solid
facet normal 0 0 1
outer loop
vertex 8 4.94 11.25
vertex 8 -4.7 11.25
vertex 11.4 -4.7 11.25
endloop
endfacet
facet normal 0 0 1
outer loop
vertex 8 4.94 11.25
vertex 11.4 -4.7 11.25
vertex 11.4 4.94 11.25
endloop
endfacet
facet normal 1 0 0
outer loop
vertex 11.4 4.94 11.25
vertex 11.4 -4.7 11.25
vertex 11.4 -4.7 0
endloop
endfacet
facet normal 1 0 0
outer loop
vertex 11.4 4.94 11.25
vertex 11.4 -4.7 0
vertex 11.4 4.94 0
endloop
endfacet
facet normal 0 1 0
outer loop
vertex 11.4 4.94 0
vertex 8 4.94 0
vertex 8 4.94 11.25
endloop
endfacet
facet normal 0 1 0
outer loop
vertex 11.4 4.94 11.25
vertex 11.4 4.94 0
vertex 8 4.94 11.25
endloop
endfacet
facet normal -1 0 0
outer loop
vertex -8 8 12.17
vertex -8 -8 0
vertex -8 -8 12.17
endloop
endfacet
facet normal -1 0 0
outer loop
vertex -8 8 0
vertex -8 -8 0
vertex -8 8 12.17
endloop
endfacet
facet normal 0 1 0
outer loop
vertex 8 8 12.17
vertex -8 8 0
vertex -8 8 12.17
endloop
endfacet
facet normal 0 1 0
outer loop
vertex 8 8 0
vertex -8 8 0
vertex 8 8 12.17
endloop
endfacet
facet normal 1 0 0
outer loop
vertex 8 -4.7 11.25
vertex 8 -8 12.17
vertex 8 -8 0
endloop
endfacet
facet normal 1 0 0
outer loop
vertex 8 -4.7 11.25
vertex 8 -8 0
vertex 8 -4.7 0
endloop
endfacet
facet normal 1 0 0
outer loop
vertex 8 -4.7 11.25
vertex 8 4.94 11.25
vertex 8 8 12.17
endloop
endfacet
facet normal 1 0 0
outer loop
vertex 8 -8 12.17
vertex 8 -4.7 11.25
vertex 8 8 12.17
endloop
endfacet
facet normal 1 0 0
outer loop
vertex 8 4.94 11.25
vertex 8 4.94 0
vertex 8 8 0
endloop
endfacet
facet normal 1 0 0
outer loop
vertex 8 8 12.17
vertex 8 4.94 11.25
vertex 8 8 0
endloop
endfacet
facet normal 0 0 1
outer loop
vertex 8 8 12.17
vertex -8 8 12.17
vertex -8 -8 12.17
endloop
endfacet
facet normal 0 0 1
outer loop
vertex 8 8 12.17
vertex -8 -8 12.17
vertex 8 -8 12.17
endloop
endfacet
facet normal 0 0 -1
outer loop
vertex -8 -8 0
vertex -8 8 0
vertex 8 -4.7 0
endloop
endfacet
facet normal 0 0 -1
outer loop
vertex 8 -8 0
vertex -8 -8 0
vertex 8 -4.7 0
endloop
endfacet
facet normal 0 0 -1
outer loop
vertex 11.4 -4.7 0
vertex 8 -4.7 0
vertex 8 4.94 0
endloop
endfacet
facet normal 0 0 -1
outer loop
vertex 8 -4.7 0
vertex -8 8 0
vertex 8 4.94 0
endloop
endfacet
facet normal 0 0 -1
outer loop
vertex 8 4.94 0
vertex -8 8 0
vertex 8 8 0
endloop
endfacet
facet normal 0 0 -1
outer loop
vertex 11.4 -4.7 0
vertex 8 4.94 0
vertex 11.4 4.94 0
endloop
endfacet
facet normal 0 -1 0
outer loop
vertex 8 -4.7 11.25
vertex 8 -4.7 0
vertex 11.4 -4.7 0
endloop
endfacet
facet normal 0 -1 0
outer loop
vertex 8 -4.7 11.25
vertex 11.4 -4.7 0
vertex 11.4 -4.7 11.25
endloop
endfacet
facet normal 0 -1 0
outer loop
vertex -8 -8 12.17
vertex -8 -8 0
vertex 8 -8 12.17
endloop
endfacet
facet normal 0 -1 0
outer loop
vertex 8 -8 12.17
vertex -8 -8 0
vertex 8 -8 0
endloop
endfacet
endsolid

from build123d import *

# Parameters (mm, degrees)
F0_W     = 16
F0_H     = 16
F1_DEPTH = 12.17
F2_W     = 9.64
F2_H     = 11.25
F3_DEPTH = 3.4


with BuildPart() as f1:
    # F0 (on Top) → F1 (new body)
    with BuildSketch(Plane.XY):
        Rectangle(F0_W, F0_H)
    extrude(amount=F1_DEPTH)

    # F2 (on face) → F3 (join)
    with BuildSketch(Plane.YZ.offset(8)):
        with Locations((0.12, 5.625)):
            Rectangle(F2_W, F2_H)
    extrude(amount=F3_DEPTH)


solid = f1.part
